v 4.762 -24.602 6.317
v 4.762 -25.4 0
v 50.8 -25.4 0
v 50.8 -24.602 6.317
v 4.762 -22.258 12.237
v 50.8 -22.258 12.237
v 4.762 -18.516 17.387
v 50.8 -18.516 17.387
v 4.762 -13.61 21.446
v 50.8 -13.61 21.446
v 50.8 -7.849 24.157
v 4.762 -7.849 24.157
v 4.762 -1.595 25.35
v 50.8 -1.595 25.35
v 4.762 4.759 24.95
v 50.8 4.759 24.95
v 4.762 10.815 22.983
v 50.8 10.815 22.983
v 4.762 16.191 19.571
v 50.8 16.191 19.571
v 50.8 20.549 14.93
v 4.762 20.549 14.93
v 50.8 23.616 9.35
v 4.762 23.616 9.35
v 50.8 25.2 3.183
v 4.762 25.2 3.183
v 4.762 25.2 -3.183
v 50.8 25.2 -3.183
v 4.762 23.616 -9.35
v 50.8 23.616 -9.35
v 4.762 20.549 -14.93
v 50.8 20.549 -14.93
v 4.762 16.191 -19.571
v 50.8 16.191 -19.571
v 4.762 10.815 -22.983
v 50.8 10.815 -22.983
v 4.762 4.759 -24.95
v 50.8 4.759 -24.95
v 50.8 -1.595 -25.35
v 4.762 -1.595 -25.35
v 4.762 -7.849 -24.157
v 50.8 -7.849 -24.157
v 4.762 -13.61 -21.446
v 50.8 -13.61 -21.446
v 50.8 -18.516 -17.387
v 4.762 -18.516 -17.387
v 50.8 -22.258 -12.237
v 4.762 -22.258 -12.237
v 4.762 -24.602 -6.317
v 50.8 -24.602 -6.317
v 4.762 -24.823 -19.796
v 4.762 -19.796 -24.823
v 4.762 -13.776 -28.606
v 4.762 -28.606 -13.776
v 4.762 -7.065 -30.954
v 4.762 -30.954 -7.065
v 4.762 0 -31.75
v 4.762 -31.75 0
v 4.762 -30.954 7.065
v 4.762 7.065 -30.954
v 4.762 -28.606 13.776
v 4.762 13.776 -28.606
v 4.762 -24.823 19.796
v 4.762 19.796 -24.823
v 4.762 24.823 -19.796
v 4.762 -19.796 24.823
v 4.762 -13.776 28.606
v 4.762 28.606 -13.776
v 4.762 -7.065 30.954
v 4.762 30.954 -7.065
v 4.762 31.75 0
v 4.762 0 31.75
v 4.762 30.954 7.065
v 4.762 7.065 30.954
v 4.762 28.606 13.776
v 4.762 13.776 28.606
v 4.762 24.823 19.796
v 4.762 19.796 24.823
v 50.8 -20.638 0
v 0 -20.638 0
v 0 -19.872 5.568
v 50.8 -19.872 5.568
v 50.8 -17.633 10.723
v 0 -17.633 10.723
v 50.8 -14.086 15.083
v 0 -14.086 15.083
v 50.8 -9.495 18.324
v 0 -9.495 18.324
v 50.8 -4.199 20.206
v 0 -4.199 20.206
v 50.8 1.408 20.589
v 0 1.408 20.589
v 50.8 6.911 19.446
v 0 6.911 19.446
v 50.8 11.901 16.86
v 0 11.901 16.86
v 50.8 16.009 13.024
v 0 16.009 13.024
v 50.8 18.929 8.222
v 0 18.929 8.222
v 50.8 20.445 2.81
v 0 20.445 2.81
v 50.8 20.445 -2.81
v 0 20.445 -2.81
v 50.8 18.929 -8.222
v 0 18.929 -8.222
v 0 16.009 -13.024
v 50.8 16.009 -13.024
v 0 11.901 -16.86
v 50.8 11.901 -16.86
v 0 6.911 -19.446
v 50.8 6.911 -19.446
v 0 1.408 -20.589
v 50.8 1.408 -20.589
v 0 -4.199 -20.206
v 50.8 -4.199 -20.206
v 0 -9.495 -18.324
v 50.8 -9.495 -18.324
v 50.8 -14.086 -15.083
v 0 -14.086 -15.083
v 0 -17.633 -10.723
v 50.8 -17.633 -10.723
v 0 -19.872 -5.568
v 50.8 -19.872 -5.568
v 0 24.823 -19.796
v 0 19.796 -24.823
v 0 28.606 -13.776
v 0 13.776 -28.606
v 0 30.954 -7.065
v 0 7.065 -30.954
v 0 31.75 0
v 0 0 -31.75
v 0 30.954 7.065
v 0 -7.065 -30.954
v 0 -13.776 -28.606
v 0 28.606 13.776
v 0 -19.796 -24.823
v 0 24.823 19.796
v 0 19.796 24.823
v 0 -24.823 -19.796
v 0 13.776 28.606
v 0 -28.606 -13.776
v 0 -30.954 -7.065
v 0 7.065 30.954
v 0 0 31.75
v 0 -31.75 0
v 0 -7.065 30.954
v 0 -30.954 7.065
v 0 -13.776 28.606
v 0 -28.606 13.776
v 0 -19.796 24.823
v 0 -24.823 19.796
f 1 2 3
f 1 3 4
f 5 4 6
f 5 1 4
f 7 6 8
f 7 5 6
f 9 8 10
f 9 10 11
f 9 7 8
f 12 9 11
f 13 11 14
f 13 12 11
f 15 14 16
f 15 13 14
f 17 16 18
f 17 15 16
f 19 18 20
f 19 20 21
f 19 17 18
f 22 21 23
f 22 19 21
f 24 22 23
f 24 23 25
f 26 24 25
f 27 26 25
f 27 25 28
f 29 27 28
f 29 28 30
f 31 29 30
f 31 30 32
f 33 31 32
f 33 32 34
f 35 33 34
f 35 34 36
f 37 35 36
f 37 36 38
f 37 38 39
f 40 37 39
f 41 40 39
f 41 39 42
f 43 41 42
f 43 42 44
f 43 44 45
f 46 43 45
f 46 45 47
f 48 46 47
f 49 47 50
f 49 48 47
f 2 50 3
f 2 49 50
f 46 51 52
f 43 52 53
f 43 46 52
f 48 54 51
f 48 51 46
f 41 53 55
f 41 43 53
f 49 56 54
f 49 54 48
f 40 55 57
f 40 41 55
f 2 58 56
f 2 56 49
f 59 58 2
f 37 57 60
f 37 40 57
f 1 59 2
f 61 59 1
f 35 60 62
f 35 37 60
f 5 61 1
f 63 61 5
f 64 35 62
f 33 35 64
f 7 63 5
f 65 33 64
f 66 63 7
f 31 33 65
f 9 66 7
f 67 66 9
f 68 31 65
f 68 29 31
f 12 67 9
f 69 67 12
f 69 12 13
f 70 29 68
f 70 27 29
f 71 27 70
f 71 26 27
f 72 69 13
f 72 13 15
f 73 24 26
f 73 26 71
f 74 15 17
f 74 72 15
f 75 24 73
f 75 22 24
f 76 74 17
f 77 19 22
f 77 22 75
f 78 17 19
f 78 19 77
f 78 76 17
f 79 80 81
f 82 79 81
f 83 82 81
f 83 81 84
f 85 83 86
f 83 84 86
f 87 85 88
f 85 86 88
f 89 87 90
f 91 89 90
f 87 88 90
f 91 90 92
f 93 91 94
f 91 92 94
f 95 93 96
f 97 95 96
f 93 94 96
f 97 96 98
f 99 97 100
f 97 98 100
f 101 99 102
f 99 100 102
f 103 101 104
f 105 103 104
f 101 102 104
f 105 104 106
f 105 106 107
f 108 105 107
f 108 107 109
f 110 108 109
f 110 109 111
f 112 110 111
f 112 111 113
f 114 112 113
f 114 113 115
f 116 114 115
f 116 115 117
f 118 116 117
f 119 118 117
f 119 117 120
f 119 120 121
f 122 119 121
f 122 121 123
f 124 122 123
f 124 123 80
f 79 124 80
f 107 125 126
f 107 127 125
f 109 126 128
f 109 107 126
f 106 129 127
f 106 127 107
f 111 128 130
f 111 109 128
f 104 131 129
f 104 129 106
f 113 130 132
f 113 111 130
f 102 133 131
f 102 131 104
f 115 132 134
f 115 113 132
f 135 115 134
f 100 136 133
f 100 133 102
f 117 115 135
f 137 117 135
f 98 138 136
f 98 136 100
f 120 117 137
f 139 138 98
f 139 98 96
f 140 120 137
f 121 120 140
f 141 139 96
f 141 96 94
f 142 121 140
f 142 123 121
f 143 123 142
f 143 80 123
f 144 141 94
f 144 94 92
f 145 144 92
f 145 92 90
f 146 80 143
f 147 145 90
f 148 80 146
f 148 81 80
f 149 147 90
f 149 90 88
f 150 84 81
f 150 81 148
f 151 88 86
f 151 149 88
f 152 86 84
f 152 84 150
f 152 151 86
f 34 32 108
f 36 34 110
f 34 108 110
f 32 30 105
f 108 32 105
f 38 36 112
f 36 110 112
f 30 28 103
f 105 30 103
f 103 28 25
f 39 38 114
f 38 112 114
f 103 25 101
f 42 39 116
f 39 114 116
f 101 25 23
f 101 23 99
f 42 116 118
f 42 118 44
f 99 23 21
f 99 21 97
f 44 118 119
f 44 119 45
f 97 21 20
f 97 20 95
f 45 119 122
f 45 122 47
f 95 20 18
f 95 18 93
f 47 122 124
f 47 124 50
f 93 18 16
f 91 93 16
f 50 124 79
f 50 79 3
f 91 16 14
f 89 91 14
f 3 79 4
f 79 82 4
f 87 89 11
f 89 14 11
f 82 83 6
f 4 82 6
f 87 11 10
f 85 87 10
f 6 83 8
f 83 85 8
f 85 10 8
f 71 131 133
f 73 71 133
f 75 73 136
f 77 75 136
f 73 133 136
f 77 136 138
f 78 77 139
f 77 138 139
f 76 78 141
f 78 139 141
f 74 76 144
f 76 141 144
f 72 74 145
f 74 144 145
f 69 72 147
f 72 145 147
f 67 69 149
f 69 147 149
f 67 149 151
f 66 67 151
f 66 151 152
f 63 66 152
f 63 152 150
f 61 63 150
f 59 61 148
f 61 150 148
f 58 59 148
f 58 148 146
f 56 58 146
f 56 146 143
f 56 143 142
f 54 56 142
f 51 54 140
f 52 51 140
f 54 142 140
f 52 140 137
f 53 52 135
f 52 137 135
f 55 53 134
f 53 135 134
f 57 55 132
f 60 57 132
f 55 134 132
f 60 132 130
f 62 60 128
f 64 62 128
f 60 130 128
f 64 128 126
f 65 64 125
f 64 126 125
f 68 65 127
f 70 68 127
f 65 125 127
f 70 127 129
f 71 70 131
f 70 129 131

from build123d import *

# Parameters (mm, degrees)
F0_R     = 31.75
F1_DEPTH = 4.7625
F2_R     = 25.4
F3_DEPTH = 50.8
F5_D     = 41.275


with BuildPart() as f1:
    # F0 (on Right) → F1 (new body)
    with BuildSketch(Plane.YZ):
        Circle(F0_R)
    extrude(amount=F1_DEPTH)

    # F2 (on face) → F3 (join)
    with BuildSketch(Plane(origin=(0, 0, 0), x_dir=(0, -1, 0), z_dir=(-1, 0, 0))):
        Circle(F2_R)
    extrude(amount=-F3_DEPTH)

    # F5 (through all)
    with Locations(Plane.YZ.offset(50.8)):
        with Locations((0, 0)):
            Hole(F5_D / 2)


solid = f1.part
